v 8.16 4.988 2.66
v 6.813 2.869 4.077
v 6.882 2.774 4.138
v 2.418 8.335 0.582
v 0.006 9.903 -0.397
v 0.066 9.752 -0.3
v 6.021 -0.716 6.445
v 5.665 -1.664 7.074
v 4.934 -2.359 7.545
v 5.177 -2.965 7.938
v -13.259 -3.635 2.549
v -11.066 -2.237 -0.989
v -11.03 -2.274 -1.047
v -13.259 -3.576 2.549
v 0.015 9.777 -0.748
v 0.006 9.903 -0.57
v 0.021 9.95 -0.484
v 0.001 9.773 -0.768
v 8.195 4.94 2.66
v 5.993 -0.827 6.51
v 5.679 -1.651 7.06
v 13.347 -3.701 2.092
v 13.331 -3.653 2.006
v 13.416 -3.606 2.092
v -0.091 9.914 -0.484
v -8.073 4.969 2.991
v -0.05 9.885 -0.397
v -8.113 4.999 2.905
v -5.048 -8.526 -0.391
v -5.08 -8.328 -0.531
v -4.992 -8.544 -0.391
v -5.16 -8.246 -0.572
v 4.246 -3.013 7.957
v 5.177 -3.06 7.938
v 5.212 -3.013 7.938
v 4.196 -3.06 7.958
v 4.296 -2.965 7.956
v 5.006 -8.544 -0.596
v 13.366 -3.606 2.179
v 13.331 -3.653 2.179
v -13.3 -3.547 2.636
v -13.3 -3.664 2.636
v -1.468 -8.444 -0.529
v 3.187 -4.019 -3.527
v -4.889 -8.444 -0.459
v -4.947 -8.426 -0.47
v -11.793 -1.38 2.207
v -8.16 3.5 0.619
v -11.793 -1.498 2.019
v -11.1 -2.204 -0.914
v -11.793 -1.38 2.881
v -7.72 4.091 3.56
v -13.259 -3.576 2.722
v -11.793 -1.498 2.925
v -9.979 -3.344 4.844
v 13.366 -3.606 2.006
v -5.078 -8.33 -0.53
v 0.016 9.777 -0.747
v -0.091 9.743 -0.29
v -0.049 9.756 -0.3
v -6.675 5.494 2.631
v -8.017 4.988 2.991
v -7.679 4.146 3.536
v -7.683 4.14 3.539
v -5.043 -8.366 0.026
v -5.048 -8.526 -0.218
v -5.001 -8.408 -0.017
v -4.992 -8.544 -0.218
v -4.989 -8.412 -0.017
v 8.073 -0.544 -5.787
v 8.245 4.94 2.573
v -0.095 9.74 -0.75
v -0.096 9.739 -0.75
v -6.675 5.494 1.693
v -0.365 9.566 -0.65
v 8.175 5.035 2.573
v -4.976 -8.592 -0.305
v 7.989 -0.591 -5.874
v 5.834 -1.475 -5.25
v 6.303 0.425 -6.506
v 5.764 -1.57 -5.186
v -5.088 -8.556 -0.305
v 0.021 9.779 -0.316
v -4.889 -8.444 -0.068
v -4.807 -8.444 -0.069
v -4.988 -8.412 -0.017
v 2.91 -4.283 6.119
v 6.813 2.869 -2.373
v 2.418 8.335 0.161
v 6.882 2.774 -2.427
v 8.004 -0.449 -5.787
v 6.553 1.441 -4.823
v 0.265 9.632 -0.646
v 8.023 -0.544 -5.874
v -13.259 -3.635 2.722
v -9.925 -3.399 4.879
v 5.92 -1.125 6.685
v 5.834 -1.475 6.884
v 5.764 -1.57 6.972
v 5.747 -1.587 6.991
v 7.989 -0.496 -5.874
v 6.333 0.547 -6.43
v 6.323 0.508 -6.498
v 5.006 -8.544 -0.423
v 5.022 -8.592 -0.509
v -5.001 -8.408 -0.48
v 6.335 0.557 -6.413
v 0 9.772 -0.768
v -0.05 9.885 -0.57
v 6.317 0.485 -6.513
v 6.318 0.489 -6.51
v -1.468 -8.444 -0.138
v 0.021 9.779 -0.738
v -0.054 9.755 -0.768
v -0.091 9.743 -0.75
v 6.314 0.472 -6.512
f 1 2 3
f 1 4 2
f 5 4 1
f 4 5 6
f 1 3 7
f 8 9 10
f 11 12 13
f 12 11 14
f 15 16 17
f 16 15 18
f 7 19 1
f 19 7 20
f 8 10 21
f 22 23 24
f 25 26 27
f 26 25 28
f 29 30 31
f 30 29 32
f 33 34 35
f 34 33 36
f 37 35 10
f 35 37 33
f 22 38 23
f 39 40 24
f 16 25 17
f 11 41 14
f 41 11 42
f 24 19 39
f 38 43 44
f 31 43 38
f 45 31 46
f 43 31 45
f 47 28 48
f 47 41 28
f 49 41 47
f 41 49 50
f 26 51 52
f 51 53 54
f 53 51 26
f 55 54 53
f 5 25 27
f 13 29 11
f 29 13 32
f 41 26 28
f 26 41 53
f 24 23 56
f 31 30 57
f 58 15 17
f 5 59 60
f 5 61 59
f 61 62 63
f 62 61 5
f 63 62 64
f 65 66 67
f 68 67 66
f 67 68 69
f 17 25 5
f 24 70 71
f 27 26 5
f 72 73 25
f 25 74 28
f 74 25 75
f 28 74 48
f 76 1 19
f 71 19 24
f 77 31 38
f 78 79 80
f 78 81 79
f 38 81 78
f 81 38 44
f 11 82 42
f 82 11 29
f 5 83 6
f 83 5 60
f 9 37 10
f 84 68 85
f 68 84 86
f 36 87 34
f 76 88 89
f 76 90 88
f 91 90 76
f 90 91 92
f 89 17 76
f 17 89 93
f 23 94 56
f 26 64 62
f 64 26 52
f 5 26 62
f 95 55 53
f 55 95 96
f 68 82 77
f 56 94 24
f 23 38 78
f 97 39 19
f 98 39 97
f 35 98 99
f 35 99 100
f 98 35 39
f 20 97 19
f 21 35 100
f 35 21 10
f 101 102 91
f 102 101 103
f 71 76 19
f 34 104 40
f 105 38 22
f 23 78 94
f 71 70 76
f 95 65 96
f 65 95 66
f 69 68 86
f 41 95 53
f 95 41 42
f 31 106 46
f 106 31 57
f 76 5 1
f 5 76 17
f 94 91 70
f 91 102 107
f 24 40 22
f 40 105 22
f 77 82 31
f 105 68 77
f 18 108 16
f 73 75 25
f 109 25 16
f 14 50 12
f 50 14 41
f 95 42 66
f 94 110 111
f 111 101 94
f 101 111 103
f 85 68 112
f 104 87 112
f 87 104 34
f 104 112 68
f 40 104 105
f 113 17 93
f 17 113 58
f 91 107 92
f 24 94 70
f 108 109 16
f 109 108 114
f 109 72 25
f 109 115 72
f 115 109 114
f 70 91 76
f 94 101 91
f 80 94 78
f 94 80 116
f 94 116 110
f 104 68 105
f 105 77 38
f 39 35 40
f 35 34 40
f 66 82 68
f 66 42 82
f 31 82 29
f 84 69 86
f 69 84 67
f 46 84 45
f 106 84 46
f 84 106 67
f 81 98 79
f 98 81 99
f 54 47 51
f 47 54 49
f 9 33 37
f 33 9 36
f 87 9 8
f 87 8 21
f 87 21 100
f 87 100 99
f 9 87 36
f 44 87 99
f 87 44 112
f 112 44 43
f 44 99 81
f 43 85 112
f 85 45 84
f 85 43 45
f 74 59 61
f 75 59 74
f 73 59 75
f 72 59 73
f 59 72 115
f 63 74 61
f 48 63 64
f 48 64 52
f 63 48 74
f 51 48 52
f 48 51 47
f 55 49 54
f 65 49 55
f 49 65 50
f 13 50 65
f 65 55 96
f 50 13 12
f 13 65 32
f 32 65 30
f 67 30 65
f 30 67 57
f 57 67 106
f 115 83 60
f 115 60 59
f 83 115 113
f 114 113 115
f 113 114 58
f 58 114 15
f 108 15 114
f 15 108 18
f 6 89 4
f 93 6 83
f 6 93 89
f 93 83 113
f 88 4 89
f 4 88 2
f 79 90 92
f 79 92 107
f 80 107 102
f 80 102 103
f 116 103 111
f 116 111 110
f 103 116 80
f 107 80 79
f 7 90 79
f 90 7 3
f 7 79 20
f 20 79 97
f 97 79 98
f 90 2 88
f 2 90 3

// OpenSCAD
// Auto-generated OpenSCAD file

    inner_points = 10*[[0.019787791635657748, -0.14747479922424916, -0.945991098230778], [-0.6594221428128932, 0.5435520084277206, -0.6986940783281456], [-0.14991280650270666, -0.8349261534325039, 0.5088787692620549], [-0.8291227409512576, -0.14389934578053432, 0.7561757891646873], [0.678236401517591, 0.27739350328859563, -0.3247565582505837], [-0.0009735329309600027, 0.9684203109405655, -0.07745953834795122], [0.5733556639568946, -0.1474747992242489, 0.5744024690680427], [-0.10585427049165638, 0.5435520084277209, 0.8216994889706752], [-0.49203656667719314, -0.8349261534325041, -0.430776131605317], [-1.171246501125744, -0.14389934578053443, -0.18347911170268458], [0.2386660365849197, 0.823975401935654, -1.03751607052968], [-0.039688911151111894, -0.3036310288659764, 1.3488645926575207]];

    outer_points = 10*[[-0.8032370415536442, 0.4940095944296054, 0.2904678526749993], [-0.8203617651133189, -0.05438177544706052, -0.5455785869967444], [0.8144576288440243, 0.4940095944296054, 0.257332643050285], [0.7973329052843495, -0.05438177544706052, -0.5787137966214586], [-0.4836041683692091, -0.30128460130981144, 0.8055814019076486], [-0.5007288919288839, -0.8496759711864774, -0.030465037764095003], [0.5161861213561083, -0.30128460130981144, 0.7851027161352226], [0.4990613977964336, -0.8496759711864774, -0.05094372353652105], [-0.0009907313780924036, 0.9855284384520768, -0.04836851458879643], [-0.01811545493776716, 0.43713706857541085, -0.8844149542605402], [-1.321886530779726, -0.3605543525439317, 0.26357607217362455], [1.3315709135143465, -0.3605543525439317, 0.20922535305718643]];

    // Convex hull for inner set (I)
    module inner_hull() {
        hull() {
            for (p = inner_points) {
                translate(p) sphere(r=0.1);
            }
        }
    }

    // Convex hull for outer set (O) minus inner hull (O \ I)
    module outer_minus_inner() {
        difference() {
            hull() {
                for (p = outer_points) {
                    translate(p) sphere(r=0.1);
                }
            }
            inner_hull(); // Subtract inner hull
        }
    }

    // Convex hull for outer set (O) minus all translated inner hulls
    module outer_minus_AllTranslationInner() {
        difference() {
            hull() {
                for (p = outer_points) {
                    translate(p) sphere(r=0.1);
                }
            }
            hull() {
                translate([0,0,50]) inner_hull();
                translate([0,0,-50]) inner_hull();
            }; // Subtract translated inner hulls
        }
    }

    // Difference between outer_minus_inner and outer_minus_AllTranslationInner
    module outer_minus_inner_diff() {
        difference() {
            // Outer minus inner
            difference() {
                hull() {
                    for (p = outer_points) {
                        translate(p) sphere(r=0.1);
                    }
                }
                inner_hull();
            }

            // Subtract Outer minus AllTranslationInner
            difference() {
                hull() {
                    for (p = outer_points) {
                        translate(p) sphere(r=0.1);
                    }
                }
                hull() {
                    translate([0,0,50]) inner_hull();
                    translate([0,0,-50]) inner_hull();
                };
            }
        }
    }

    // Rendering all with colors applied
    color([0, 1, 0, 1]) outer_minus_AllTranslationInner(); // Opaque green
    
